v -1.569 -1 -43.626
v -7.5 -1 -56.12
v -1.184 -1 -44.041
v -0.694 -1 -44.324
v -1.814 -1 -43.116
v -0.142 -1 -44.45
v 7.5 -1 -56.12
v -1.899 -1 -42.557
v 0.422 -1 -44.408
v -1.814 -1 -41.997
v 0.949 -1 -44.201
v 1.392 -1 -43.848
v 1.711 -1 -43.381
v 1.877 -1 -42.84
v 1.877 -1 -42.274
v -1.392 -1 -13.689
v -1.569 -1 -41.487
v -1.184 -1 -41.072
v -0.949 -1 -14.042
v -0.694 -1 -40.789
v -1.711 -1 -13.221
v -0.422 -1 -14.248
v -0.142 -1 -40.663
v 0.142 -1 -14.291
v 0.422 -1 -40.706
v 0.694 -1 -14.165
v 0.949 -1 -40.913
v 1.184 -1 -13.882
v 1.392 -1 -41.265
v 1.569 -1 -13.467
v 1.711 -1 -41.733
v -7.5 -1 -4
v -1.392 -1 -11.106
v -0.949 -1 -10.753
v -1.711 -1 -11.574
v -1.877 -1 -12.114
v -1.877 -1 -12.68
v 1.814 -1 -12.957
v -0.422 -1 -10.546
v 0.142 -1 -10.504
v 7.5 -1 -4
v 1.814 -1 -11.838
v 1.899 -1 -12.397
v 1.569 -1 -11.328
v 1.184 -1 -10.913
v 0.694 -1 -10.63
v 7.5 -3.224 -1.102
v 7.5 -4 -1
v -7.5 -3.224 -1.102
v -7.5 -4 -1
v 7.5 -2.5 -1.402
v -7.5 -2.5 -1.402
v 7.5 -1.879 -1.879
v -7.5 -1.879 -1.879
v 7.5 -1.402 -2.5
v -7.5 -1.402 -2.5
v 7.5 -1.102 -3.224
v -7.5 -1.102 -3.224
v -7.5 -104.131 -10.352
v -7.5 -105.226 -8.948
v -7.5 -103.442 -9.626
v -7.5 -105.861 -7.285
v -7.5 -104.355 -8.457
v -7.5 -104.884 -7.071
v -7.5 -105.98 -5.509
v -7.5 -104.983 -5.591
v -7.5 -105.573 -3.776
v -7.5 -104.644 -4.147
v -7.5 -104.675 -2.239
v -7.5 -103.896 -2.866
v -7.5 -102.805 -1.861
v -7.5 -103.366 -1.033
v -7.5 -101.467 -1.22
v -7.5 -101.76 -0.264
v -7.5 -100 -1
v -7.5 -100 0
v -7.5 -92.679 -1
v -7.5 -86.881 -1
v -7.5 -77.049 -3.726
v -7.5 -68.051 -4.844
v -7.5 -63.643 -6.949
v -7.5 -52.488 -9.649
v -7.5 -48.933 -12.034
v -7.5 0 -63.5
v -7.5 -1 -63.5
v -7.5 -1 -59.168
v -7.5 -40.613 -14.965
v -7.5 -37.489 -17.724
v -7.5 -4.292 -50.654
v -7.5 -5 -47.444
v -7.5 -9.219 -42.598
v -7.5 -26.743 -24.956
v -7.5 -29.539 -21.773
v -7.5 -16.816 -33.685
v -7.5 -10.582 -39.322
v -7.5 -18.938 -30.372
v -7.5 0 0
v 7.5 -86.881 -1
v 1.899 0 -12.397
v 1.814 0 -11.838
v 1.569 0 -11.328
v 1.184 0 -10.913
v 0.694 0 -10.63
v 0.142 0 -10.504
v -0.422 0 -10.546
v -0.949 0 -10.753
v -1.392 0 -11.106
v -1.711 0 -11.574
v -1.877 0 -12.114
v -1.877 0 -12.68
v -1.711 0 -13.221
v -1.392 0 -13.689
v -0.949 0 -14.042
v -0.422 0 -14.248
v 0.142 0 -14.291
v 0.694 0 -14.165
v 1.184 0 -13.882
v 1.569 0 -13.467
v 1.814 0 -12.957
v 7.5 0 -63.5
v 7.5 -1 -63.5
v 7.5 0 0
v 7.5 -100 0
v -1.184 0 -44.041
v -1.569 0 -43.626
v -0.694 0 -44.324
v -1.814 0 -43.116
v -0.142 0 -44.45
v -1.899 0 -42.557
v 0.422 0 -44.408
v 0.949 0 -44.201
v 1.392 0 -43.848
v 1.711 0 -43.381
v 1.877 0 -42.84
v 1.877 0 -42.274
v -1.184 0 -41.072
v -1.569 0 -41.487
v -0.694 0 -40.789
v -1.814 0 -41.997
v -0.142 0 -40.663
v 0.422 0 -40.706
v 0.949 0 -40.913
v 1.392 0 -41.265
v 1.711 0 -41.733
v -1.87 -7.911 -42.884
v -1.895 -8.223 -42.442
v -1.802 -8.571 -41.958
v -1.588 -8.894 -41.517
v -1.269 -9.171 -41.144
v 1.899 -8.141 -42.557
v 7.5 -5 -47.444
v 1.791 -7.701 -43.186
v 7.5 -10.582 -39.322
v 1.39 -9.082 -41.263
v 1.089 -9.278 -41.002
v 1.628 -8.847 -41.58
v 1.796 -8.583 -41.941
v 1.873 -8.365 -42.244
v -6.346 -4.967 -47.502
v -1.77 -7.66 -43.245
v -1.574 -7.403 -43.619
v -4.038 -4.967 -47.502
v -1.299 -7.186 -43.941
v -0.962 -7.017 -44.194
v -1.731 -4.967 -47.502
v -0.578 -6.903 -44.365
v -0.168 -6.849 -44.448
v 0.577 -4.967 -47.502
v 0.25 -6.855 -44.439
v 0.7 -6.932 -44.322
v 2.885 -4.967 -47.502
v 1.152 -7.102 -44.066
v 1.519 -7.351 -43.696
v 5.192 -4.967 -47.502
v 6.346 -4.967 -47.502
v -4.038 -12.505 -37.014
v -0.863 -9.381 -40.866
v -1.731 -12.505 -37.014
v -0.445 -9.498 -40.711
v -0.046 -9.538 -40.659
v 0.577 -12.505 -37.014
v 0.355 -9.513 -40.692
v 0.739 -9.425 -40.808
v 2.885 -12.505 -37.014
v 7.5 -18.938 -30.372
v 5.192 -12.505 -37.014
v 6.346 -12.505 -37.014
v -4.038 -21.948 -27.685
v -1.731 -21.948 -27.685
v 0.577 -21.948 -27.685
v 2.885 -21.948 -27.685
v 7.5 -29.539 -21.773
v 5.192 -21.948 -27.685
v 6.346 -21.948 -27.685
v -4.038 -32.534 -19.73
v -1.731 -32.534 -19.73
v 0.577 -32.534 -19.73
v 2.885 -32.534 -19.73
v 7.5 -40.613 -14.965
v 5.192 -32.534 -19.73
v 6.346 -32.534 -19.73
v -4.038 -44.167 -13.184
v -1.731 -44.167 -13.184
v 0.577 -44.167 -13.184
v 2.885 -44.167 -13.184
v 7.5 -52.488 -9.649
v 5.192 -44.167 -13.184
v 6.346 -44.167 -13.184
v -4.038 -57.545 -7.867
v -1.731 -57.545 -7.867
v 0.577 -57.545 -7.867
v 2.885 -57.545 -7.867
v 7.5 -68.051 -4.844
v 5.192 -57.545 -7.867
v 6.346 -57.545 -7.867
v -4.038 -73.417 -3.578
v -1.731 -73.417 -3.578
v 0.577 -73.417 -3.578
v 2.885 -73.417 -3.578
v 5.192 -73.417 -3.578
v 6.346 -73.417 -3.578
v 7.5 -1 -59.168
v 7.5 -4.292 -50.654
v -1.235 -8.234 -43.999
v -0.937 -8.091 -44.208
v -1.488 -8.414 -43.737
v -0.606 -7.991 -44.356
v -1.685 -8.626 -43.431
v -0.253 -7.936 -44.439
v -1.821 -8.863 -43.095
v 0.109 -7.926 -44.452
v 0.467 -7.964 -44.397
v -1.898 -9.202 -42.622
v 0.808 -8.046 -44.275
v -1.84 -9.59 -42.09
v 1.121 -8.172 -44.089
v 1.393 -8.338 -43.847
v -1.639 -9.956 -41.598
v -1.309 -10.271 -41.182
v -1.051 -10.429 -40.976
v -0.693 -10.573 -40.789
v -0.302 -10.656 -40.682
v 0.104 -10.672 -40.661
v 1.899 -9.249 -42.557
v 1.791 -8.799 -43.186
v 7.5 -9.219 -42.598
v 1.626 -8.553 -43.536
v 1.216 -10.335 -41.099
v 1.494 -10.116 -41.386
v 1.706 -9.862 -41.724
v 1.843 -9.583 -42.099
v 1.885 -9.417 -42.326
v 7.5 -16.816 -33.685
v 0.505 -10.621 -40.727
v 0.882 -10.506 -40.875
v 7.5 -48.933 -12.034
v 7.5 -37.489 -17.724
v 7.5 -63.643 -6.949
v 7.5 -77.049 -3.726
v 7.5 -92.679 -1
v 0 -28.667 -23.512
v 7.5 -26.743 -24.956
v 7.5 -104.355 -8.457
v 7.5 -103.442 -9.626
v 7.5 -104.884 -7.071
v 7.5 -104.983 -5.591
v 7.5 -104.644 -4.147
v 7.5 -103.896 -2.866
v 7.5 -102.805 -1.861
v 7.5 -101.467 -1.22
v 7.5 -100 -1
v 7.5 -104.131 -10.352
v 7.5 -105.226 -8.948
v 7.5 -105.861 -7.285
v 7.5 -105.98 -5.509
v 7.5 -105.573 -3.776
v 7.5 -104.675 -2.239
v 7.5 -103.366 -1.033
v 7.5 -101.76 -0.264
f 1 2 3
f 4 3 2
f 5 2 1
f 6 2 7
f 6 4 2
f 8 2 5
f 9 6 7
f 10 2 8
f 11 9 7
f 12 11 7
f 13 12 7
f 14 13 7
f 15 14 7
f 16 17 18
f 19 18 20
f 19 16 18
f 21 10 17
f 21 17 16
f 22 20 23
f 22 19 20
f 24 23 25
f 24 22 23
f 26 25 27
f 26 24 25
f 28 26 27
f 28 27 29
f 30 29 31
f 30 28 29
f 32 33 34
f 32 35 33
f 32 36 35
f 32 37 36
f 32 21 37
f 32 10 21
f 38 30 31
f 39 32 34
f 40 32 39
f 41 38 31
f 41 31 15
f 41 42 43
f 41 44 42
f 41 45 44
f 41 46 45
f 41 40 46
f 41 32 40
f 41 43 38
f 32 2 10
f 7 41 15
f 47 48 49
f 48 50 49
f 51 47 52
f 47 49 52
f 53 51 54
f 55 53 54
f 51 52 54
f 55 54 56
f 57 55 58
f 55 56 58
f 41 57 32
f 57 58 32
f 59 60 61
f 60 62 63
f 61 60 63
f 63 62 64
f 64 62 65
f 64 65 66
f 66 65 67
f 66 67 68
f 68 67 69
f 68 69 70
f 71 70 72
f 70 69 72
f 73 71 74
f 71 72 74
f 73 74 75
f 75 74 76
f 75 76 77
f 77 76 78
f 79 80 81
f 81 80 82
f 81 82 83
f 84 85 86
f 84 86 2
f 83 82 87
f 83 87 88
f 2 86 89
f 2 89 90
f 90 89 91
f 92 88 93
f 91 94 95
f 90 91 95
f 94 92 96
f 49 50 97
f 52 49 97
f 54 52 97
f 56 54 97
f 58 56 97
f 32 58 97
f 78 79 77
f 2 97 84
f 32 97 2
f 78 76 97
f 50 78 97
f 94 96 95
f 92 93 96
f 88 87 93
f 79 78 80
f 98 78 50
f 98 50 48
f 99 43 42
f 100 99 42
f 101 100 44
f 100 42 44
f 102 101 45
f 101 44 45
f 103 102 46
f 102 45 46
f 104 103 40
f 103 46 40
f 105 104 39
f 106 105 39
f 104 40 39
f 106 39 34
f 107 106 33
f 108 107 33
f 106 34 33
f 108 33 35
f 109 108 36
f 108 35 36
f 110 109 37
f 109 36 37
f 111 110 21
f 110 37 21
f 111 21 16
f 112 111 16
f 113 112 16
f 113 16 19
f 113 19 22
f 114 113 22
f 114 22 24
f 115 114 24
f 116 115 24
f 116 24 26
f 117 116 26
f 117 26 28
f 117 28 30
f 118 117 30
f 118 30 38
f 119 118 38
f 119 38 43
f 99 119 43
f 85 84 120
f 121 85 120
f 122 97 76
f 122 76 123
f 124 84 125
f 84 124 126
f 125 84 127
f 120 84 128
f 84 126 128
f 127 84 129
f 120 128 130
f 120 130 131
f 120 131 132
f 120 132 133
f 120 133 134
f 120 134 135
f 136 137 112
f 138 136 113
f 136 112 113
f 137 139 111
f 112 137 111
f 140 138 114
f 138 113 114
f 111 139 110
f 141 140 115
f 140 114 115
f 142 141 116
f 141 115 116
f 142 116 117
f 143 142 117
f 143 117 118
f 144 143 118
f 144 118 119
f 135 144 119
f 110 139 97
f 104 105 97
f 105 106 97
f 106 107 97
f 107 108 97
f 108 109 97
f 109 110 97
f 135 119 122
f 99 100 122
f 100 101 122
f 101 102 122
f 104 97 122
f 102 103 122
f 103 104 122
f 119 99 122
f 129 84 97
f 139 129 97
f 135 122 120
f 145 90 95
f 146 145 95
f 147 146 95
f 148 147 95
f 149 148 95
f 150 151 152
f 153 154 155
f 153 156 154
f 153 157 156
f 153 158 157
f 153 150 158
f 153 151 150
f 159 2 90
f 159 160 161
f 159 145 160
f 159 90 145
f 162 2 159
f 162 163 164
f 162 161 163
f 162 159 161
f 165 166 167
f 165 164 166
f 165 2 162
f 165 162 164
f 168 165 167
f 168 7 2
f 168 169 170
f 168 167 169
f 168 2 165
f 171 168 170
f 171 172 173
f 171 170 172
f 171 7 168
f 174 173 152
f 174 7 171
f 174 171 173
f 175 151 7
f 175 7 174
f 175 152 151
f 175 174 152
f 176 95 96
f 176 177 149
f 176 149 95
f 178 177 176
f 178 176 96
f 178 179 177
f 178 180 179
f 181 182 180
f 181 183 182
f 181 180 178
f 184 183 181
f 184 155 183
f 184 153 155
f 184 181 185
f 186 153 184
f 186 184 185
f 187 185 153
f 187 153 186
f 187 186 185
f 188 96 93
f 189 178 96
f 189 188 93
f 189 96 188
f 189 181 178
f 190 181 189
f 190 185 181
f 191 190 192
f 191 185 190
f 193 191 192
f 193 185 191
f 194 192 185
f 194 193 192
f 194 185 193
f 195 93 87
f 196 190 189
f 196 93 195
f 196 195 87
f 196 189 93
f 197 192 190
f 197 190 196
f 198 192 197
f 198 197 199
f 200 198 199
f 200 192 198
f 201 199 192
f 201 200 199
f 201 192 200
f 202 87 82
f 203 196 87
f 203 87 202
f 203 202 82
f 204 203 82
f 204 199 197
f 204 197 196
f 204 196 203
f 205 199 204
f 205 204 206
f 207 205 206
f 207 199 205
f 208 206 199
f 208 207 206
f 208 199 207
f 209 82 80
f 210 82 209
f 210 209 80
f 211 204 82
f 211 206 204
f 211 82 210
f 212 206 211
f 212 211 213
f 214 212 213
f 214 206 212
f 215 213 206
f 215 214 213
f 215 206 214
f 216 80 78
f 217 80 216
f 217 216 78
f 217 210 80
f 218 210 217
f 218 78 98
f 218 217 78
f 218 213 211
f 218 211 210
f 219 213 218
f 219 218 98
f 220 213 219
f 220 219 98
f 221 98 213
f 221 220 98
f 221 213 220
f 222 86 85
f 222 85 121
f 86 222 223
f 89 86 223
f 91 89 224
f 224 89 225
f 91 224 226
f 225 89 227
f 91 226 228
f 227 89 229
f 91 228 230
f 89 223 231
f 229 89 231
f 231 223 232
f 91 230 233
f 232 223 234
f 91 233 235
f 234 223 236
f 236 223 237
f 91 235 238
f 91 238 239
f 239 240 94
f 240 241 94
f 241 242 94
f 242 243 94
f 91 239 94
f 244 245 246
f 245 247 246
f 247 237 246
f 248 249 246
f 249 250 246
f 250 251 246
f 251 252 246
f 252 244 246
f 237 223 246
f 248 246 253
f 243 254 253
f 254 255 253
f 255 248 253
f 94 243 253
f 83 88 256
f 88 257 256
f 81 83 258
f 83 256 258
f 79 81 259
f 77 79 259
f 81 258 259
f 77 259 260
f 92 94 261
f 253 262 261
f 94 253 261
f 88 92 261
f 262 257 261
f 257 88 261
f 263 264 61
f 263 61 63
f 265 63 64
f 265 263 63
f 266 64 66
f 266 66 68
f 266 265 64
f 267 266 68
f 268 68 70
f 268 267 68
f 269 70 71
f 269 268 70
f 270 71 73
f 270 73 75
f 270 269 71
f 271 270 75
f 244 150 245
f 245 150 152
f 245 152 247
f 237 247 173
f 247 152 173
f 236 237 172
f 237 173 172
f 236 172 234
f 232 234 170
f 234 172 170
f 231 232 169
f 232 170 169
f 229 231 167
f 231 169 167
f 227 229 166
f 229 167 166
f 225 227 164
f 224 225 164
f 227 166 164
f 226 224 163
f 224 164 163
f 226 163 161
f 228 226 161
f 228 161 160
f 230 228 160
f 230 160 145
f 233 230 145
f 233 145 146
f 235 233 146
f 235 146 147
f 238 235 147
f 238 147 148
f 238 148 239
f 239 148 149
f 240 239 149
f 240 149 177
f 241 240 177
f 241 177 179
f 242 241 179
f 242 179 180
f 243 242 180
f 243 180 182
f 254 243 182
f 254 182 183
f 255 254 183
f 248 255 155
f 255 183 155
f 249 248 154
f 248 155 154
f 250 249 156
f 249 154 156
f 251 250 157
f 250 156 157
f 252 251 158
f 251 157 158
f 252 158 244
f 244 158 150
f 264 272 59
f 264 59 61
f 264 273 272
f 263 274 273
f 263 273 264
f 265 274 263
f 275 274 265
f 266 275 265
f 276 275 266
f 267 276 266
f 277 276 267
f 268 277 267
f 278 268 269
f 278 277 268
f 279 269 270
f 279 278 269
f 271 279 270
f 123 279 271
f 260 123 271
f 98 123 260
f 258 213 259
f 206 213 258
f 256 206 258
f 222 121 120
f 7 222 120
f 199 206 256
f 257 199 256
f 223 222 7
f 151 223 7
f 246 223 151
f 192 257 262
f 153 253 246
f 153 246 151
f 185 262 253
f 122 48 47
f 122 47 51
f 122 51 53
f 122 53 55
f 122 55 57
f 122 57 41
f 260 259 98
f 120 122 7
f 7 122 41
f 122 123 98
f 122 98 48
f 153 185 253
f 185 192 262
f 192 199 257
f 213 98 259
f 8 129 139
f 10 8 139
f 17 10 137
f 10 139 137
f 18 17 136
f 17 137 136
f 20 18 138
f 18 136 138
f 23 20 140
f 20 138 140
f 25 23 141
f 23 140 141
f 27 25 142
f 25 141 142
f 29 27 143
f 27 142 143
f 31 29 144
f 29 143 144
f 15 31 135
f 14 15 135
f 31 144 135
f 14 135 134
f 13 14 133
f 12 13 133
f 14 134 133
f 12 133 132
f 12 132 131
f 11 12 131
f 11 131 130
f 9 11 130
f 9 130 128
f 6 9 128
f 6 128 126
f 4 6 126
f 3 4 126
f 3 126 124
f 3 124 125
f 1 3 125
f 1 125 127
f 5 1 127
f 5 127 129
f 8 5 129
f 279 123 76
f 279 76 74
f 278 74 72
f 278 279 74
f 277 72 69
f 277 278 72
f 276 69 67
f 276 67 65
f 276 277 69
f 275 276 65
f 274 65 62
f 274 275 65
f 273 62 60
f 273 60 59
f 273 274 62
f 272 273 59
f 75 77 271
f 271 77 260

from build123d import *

# Parameters (mm, degrees)
F0_W      = 15
F0_H      = 63.5
F1_DEPTH  = 1
F2_W      = 15
F2_H      = 100
F3_DEPTH  = 1
F5_DEPTH  = 15
F7_D      = 3.7973
F7_DEPTH  = 1.0010001
F8_D      = 3.7973
F8_DEPTH  = 99.0010001
F9_D      = 3.7973
F10_R     = 3
F12_DEPTH = 15


# Not quite as in the source:
# - the dataset's text gives a spline's control points without its knots; the knots are read off the source's solid


with BuildPart() as f1:
    # F0 (on Front) → F1 (new body)
    with BuildSketch(Plane.XZ):
        with Locations((0, -31.75)):
            Rectangle(F0_W, F0_H)
    extrude(amount=F1_DEPTH)

    # F2 (on Top) → F3 (join)
    with BuildSketch(Plane.XY):
        with Locations((0, -50)):
            Rectangle(F2_W, F2_H)
    extrude(amount=-F3_DEPTH)

    # F4 (on face) → F5 (join, through all)
    with BuildSketch(Plane.YZ.offset(7.5)):
        with BuildLine():
            add(Edge.make_bspline(
                [(-1, -59.1678209603), (-4.7628395259, -45.3067980707), (-29.7762758586, -17.4602950514), (-61.8860200047, -5.5842199363), (-92.6793441176, -1)],
                knots=[0, 0, 0, 0, 0.4491979362, 1, 1, 1, 1], degree=3))
            Line((-1, -59.1678209603), (-0.1314357545, -58.9320325989))
            add(Edge.make_bspline(
                [(-0.1314357545, -58.9320325989), (-1.2015793269, -54.989987117), (-3.6884016693, -49.2559925066), (-8.3530917512, -42.083257521), (-12.4261382193, -36.9661666224), (-16.9750747913, -32.1385398724), (-21.9011436861, -27.6279890298), (-27.1107997825, -23.4618046647), (-32.4934625877, -19.6712415186), (-38.1217352473, -16.235966274), (-44.0944999552, -13.1322911599), (-50.5030405646, -10.3365734857), (-59.7536135039, -6.9863101985), (-72.8745679903, -3.4418665365), (-85.5418056788, -1.1526510188), (-92.5468210682, -0.109810334)],
                knots=[0, 0, 0, 0, 0.125, 0.1875, 0.25, 0.3125, 0.375, 0.4375, 0.5, 0.5625, 0.625, 0.6875, 0.75, 0.875, 1, 1, 1, 1], degree=3))
            Line((-92.5468210682, -0.109810334), (-92.6793441176, -1))
        make_face()
    extrude(amount=-F5_DEPTH)

    # F7 (through all, one way)
    with BuildSketch(Plane.XZ.offset(1)):
        with Locations((0, -12.3973852023)):
            Circle(F7_D / 2)
    extrude(amount=-F7_DEPTH, mode=Mode.SUBTRACT)

    # F8 (through all, one way)
    with BuildSketch(Plane(origin=(0, -1, 0), x_dir=(1, 0, 0), z_dir=(0, 1, 0))):
        with Locations((0, 42.5568334758)):
            Circle(F8_D / 2)
    extrude(amount=-F8_DEPTH, mode=Mode.SUBTRACT)

    # F9 (through all)
    with Locations(Plane.XZ.offset(1)):
        with Locations((0, -42.5568334758)):
            Hole(F9_D / 2)

    # F10
    f10_edges = [f1.edges().sort_by_distance(p)[0] for p in [
        (0, -1, -1),
    ]]
    fillet(f10_edges, radius=F10_R)

    # F11 (on face) → F12 (join, through all)
    with BuildSketch(Plane.YZ.offset(7.5)):
        with BuildLine():
            Line((-100, -1), (-100, 0))
            ThreePointArc((-100, 0), (-105.5726686693, -3.7761825834), (-104.1308658813, -10.3515453659))
            Line((-104.1308658813, -10.3515453659), (-103.4423882344, -9.6262878049))
            ThreePointArc((-103.4423882344, -9.6262878049), (-104.6438905577, -4.1468188195), (-100, -1))
        make_face()
    extrude(amount=-F12_DEPTH)


solid = f1.part
